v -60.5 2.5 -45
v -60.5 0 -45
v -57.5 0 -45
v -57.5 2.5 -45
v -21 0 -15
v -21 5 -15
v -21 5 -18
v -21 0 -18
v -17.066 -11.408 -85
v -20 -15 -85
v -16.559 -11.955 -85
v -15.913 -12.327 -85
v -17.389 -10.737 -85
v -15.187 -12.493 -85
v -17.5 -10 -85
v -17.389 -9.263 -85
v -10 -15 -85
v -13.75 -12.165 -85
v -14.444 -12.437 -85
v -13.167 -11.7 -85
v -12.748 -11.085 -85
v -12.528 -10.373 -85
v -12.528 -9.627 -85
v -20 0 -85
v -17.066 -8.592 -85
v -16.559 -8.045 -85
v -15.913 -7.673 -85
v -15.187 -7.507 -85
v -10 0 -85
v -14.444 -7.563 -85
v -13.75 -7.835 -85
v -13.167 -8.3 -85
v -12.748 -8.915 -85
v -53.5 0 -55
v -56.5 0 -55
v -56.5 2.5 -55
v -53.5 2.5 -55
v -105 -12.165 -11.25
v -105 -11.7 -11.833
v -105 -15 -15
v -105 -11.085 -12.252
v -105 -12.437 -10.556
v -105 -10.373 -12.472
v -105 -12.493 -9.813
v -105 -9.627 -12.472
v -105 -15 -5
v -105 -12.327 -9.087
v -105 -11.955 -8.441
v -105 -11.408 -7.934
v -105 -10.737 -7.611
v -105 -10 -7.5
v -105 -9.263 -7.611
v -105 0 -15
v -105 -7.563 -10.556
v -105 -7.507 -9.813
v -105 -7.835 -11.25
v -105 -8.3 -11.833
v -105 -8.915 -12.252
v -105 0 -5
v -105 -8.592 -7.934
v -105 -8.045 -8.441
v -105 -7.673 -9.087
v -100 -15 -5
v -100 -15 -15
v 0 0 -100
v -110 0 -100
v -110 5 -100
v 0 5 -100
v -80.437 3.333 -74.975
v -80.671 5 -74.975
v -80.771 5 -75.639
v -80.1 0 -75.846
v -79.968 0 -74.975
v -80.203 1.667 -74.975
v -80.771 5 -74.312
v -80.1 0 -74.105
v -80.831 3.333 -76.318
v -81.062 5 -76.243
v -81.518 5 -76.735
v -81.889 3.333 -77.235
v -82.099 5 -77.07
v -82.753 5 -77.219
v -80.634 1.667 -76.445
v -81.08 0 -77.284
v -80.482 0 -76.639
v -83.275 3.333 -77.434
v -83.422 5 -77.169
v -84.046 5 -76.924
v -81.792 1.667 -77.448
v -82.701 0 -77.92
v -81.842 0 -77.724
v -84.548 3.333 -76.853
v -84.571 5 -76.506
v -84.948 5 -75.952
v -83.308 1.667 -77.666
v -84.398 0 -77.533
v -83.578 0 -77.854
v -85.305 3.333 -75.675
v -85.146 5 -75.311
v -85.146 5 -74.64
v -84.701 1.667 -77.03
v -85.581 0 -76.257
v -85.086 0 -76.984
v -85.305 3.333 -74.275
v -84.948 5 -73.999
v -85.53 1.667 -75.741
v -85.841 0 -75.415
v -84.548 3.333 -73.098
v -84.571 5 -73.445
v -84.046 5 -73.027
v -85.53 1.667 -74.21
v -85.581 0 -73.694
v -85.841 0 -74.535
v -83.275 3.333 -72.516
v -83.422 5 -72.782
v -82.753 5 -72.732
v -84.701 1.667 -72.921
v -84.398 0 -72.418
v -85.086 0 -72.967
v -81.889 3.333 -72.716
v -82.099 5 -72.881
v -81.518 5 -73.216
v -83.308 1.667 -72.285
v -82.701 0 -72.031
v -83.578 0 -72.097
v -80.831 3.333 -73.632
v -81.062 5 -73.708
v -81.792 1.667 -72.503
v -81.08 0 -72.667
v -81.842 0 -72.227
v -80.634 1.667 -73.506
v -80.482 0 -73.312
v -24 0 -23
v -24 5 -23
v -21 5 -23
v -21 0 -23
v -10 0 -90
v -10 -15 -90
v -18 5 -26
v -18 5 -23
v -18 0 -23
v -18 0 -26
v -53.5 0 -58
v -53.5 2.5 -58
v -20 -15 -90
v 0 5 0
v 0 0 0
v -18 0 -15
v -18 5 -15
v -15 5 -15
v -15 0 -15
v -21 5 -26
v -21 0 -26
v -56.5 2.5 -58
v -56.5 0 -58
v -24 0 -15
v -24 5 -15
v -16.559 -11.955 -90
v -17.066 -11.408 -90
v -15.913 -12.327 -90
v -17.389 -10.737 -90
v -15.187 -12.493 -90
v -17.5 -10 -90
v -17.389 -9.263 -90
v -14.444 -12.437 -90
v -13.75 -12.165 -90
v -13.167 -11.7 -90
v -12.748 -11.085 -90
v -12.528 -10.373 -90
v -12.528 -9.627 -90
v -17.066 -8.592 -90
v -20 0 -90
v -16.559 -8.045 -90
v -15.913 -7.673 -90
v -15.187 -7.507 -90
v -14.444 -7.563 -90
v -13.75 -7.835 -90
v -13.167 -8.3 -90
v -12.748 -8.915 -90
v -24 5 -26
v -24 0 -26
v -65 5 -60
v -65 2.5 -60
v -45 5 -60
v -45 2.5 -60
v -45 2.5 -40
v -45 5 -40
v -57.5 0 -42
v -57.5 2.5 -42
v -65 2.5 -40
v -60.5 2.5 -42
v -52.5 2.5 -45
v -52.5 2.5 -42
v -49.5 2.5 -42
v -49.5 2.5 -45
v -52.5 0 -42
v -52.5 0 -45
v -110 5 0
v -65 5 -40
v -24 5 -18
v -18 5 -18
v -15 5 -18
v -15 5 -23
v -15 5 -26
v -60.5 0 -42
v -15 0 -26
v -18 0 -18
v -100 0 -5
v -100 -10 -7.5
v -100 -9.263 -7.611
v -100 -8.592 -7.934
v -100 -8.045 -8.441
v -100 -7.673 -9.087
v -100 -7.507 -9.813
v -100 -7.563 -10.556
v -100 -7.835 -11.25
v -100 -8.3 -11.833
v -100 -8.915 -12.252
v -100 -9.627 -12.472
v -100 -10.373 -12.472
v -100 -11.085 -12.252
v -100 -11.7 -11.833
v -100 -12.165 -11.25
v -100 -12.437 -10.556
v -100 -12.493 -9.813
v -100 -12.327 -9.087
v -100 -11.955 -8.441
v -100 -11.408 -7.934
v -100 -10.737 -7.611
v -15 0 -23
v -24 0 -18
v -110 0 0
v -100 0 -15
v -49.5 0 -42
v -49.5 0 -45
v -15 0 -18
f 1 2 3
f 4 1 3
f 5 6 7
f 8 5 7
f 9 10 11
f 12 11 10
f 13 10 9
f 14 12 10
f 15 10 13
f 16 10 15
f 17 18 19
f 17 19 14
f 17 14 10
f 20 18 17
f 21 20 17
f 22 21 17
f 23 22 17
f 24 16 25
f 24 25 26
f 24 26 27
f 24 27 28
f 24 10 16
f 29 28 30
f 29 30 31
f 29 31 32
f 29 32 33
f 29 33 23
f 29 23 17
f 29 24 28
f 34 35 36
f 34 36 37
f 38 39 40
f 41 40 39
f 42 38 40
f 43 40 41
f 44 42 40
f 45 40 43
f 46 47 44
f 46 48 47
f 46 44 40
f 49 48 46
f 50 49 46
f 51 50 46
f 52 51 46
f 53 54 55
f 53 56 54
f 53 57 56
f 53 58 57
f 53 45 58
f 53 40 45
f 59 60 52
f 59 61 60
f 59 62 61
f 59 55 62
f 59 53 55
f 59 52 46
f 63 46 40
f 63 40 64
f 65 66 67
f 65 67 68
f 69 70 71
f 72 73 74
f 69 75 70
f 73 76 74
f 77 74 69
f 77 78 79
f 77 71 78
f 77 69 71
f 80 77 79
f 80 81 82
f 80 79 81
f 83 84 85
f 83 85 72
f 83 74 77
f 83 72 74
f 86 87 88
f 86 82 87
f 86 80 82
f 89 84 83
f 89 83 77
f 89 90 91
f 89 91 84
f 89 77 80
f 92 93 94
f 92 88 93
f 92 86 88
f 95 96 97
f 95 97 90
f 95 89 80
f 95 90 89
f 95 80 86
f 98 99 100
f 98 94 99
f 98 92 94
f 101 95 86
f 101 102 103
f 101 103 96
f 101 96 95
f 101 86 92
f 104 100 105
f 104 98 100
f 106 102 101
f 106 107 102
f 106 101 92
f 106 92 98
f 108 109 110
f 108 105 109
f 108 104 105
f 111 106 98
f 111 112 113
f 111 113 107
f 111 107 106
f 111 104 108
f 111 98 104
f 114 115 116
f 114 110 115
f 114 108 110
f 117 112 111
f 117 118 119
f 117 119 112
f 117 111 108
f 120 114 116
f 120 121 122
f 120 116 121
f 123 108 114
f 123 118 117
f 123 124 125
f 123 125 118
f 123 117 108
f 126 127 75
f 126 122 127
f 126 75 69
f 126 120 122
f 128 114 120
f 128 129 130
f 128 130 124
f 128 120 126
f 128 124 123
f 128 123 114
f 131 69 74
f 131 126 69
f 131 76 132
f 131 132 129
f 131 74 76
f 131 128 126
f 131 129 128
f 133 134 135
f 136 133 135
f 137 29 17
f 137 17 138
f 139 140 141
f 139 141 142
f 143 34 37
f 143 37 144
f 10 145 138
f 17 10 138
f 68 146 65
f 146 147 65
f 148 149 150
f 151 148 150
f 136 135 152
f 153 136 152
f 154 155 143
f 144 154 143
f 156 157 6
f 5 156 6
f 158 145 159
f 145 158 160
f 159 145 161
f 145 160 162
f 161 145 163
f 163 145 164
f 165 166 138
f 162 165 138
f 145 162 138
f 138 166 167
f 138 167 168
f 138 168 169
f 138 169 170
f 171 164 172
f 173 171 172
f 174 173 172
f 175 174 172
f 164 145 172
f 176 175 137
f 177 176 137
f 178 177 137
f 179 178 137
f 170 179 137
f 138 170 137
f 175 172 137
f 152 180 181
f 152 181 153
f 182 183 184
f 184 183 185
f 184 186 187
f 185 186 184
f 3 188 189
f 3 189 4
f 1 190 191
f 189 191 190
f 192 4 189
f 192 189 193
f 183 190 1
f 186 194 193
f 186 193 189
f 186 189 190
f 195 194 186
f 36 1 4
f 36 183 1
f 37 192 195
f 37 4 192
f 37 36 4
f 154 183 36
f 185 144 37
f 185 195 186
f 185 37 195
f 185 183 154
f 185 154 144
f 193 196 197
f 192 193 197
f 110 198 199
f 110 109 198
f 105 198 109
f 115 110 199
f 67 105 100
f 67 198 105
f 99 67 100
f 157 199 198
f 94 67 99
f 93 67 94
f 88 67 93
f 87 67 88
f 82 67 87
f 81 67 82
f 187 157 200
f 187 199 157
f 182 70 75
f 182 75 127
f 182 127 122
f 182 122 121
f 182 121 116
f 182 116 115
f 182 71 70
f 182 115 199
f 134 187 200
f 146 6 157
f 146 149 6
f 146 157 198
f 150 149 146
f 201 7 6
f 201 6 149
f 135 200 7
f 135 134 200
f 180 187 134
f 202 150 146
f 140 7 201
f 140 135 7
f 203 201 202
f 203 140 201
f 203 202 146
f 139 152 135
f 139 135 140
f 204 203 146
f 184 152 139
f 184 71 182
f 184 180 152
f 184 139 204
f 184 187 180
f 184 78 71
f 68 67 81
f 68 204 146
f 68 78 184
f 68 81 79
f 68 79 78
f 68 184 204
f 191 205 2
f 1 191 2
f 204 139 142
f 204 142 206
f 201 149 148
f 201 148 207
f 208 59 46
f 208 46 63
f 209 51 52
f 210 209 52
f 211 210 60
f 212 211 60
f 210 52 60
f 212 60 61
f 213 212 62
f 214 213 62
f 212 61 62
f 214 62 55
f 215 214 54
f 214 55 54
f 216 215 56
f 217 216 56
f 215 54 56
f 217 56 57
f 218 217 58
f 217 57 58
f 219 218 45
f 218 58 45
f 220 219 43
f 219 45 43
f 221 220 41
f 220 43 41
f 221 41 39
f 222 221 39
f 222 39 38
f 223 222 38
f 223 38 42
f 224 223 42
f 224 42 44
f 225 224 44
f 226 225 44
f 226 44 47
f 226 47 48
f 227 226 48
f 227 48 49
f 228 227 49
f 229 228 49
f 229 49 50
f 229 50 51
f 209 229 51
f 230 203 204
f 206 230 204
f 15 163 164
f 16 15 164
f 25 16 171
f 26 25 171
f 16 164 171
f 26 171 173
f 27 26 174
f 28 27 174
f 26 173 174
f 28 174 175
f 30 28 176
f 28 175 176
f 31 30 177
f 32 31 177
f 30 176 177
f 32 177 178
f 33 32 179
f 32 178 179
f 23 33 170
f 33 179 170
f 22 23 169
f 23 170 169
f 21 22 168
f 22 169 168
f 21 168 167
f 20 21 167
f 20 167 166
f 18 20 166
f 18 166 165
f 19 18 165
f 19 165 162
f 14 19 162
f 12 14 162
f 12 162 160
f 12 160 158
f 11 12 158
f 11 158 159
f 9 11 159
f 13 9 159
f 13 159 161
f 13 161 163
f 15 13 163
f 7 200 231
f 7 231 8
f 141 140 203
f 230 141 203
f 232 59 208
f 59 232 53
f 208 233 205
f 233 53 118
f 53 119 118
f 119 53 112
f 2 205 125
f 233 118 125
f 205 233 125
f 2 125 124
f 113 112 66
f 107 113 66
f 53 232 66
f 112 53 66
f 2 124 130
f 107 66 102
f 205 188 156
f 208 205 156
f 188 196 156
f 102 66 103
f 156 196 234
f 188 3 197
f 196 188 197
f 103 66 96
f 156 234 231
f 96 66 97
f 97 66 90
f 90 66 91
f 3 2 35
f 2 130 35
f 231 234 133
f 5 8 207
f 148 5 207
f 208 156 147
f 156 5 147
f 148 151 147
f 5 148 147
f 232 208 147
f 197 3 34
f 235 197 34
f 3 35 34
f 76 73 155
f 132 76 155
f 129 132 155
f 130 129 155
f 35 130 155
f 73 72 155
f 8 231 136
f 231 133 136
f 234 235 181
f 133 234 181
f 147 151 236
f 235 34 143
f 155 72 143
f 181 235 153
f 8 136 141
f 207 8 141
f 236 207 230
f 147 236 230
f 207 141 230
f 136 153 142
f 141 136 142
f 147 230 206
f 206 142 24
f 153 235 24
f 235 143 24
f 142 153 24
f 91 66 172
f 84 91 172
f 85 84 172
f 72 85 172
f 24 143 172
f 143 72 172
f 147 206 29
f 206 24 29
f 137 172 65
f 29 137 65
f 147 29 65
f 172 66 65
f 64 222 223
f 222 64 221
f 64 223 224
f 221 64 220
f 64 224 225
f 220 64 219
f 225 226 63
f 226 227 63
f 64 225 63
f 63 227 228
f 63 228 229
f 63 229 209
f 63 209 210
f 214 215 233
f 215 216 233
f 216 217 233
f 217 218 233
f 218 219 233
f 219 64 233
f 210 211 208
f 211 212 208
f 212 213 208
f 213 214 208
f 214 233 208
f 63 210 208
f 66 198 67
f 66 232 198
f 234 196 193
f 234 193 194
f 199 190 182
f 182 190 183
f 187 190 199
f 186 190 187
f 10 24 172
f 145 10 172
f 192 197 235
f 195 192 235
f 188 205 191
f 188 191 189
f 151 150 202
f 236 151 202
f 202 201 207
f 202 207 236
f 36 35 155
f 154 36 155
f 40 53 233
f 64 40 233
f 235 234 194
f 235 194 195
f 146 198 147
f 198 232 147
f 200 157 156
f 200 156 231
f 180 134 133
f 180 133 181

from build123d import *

# Parameters (mm, degrees)
SKETCH1_W           = 110
SKETCH1_H           = 100
SKETCH1_W_2         = 3
SKETCH1_H_2         = 3
BOSS_EXTRUDE1_DEPTH = 2.5
SKETCH2_W           = 110
SKETCH2_H           = 100
SKETCH2_W_2         = 20
SKETCH2_H_2         = 20
BOSS_EXTRUDE2_DEPTH = 2.5
SKETCH3_R           = 2.25
CUT_EXTRUDE1_DEPTH  = 6
CUT_EXTRUDE1_TAPER  = -8
SKETCH4_W           = 3
SKETCH4_H           = 3
CUT_EXTRUDE2_DEPTH  = 6.0000001
SKETCH5_W           = 10
SKETCH5_H           = 5
BOSS_EXTRUDE3_DEPTH = 20
SKETCH8_R           = 2.5
CUT_EXTRUDE4_DEPTH  = 15
SKETCH9_W           = 5
SKETCH9_H           = 10
BOSS_EXTRUDE4_DEPTH = 15
SKETCH10_R          = 2.5
CUT_EXTRUDE5_DEPTH  = 15


with BuildPart() as part:
    # Sketch1 → Boss-Extrude1 (new body)
    with BuildSketch(Plane(origin=(0, 0, 0), x_dir=(1, 0, 0), z_dir=(0, 1, 0))):
        with Locations((-55, 50)):
            Rectangle(SKETCH1_W, SKETCH1_H)
        with Locations((-59, 43.5)):
            Rectangle(SKETCH1_W_2, SKETCH1_H_2, mode=Mode.SUBTRACT)
        with Locations((-51, 43.5)):
            Rectangle(SKETCH1_W_2, SKETCH1_H_2, mode=Mode.SUBTRACT)
        with Locations((-55, 56.5)):
            Rectangle(SKETCH1_W_2, SKETCH1_H_2, mode=Mode.SUBTRACT)
    extrude(amount=BOSS_EXTRUDE1_DEPTH)

    # Sketch2 → Boss-Extrude2 (add)
    with BuildSketch(Plane(origin=(0, 2.5, 0), x_dir=(1, 0, 0), z_dir=(0, 1, 0))):
        with Locations((-55, 50)):
            Rectangle(SKETCH2_W, SKETCH2_H)
        with Locations((-55, 50)):
            Rectangle(SKETCH2_W_2, SKETCH2_H_2, mode=Mode.SUBTRACT)
    extrude(amount=BOSS_EXTRUDE2_DEPTH)

    # Sketch3 → Cut-Extrude1 (cut, through all)
    with BuildSketch(Plane(origin=(0, 5, 0), x_dir=(1, 0, 0), z_dir=(0, 1, 0))):
        with Locations((-82.921200256, 74.97538555)):
            Circle(SKETCH3_R)
    extrude(amount=-CUT_EXTRUDE1_DEPTH, taper=CUT_EXTRUDE1_TAPER, mode=Mode.SUBTRACT)

    # Sketch4 → Cut-Extrude2 (cut, through all)
    with BuildSketch(Plane(origin=(0, 5, 0), x_dir=(1, 0, 0), z_dir=(0, 1, 0))):
        with Locations((-22.5, 24.5)):
            Rectangle(SKETCH4_W, SKETCH4_H)
        with Locations((-16.5, 24.5)):
            Rectangle(SKETCH4_W, SKETCH4_H)
        with Locations((-22.5, 16.5)):
            Rectangle(SKETCH4_W, SKETCH4_H)
        with Locations((-16.5, 16.5)):
            Rectangle(SKETCH4_W, SKETCH4_H)
    extrude(amount=-CUT_EXTRUDE2_DEPTH, mode=Mode.SUBTRACT)

    # Sketch5 → Boss-Extrude3 (add)
    with BuildSketch(Plane(origin=(0, 5, 0), x_dir=(1, 0, 0), z_dir=(0, 1, 0))):
        with Locations((-15, 87.5)):
            Rectangle(SKETCH5_W, SKETCH5_H)
    extrude(amount=-BOSS_EXTRUDE3_DEPTH)

    # Sketch8 → Cut-Extrude4 (cut)
    with BuildSketch(Plane(origin=(0, 0, -90), x_dir=(-1, 0, 0), z_dir=(0, 0, -1))):
        with Locations((15, -10)):
            Circle(SKETCH8_R)
    extrude(amount=-CUT_EXTRUDE4_DEPTH, mode=Mode.SUBTRACT)

    # Sketch9 → Boss-Extrude4 (add)
    with BuildSketch(Plane.XZ):
        with Locations((-102.5, -10)):
            Rectangle(SKETCH9_W, SKETCH9_H)
    extrude(amount=BOSS_EXTRUDE4_DEPTH)

    # Sketch10 → Cut-Extrude5 (cut)
    with BuildSketch(Plane.ZY.offset(105)):
        with Locations((-10, -10)):
            Circle(SKETCH10_R)
    extrude(amount=-CUT_EXTRUDE5_DEPTH, mode=Mode.SUBTRACT)


solid = part.part
